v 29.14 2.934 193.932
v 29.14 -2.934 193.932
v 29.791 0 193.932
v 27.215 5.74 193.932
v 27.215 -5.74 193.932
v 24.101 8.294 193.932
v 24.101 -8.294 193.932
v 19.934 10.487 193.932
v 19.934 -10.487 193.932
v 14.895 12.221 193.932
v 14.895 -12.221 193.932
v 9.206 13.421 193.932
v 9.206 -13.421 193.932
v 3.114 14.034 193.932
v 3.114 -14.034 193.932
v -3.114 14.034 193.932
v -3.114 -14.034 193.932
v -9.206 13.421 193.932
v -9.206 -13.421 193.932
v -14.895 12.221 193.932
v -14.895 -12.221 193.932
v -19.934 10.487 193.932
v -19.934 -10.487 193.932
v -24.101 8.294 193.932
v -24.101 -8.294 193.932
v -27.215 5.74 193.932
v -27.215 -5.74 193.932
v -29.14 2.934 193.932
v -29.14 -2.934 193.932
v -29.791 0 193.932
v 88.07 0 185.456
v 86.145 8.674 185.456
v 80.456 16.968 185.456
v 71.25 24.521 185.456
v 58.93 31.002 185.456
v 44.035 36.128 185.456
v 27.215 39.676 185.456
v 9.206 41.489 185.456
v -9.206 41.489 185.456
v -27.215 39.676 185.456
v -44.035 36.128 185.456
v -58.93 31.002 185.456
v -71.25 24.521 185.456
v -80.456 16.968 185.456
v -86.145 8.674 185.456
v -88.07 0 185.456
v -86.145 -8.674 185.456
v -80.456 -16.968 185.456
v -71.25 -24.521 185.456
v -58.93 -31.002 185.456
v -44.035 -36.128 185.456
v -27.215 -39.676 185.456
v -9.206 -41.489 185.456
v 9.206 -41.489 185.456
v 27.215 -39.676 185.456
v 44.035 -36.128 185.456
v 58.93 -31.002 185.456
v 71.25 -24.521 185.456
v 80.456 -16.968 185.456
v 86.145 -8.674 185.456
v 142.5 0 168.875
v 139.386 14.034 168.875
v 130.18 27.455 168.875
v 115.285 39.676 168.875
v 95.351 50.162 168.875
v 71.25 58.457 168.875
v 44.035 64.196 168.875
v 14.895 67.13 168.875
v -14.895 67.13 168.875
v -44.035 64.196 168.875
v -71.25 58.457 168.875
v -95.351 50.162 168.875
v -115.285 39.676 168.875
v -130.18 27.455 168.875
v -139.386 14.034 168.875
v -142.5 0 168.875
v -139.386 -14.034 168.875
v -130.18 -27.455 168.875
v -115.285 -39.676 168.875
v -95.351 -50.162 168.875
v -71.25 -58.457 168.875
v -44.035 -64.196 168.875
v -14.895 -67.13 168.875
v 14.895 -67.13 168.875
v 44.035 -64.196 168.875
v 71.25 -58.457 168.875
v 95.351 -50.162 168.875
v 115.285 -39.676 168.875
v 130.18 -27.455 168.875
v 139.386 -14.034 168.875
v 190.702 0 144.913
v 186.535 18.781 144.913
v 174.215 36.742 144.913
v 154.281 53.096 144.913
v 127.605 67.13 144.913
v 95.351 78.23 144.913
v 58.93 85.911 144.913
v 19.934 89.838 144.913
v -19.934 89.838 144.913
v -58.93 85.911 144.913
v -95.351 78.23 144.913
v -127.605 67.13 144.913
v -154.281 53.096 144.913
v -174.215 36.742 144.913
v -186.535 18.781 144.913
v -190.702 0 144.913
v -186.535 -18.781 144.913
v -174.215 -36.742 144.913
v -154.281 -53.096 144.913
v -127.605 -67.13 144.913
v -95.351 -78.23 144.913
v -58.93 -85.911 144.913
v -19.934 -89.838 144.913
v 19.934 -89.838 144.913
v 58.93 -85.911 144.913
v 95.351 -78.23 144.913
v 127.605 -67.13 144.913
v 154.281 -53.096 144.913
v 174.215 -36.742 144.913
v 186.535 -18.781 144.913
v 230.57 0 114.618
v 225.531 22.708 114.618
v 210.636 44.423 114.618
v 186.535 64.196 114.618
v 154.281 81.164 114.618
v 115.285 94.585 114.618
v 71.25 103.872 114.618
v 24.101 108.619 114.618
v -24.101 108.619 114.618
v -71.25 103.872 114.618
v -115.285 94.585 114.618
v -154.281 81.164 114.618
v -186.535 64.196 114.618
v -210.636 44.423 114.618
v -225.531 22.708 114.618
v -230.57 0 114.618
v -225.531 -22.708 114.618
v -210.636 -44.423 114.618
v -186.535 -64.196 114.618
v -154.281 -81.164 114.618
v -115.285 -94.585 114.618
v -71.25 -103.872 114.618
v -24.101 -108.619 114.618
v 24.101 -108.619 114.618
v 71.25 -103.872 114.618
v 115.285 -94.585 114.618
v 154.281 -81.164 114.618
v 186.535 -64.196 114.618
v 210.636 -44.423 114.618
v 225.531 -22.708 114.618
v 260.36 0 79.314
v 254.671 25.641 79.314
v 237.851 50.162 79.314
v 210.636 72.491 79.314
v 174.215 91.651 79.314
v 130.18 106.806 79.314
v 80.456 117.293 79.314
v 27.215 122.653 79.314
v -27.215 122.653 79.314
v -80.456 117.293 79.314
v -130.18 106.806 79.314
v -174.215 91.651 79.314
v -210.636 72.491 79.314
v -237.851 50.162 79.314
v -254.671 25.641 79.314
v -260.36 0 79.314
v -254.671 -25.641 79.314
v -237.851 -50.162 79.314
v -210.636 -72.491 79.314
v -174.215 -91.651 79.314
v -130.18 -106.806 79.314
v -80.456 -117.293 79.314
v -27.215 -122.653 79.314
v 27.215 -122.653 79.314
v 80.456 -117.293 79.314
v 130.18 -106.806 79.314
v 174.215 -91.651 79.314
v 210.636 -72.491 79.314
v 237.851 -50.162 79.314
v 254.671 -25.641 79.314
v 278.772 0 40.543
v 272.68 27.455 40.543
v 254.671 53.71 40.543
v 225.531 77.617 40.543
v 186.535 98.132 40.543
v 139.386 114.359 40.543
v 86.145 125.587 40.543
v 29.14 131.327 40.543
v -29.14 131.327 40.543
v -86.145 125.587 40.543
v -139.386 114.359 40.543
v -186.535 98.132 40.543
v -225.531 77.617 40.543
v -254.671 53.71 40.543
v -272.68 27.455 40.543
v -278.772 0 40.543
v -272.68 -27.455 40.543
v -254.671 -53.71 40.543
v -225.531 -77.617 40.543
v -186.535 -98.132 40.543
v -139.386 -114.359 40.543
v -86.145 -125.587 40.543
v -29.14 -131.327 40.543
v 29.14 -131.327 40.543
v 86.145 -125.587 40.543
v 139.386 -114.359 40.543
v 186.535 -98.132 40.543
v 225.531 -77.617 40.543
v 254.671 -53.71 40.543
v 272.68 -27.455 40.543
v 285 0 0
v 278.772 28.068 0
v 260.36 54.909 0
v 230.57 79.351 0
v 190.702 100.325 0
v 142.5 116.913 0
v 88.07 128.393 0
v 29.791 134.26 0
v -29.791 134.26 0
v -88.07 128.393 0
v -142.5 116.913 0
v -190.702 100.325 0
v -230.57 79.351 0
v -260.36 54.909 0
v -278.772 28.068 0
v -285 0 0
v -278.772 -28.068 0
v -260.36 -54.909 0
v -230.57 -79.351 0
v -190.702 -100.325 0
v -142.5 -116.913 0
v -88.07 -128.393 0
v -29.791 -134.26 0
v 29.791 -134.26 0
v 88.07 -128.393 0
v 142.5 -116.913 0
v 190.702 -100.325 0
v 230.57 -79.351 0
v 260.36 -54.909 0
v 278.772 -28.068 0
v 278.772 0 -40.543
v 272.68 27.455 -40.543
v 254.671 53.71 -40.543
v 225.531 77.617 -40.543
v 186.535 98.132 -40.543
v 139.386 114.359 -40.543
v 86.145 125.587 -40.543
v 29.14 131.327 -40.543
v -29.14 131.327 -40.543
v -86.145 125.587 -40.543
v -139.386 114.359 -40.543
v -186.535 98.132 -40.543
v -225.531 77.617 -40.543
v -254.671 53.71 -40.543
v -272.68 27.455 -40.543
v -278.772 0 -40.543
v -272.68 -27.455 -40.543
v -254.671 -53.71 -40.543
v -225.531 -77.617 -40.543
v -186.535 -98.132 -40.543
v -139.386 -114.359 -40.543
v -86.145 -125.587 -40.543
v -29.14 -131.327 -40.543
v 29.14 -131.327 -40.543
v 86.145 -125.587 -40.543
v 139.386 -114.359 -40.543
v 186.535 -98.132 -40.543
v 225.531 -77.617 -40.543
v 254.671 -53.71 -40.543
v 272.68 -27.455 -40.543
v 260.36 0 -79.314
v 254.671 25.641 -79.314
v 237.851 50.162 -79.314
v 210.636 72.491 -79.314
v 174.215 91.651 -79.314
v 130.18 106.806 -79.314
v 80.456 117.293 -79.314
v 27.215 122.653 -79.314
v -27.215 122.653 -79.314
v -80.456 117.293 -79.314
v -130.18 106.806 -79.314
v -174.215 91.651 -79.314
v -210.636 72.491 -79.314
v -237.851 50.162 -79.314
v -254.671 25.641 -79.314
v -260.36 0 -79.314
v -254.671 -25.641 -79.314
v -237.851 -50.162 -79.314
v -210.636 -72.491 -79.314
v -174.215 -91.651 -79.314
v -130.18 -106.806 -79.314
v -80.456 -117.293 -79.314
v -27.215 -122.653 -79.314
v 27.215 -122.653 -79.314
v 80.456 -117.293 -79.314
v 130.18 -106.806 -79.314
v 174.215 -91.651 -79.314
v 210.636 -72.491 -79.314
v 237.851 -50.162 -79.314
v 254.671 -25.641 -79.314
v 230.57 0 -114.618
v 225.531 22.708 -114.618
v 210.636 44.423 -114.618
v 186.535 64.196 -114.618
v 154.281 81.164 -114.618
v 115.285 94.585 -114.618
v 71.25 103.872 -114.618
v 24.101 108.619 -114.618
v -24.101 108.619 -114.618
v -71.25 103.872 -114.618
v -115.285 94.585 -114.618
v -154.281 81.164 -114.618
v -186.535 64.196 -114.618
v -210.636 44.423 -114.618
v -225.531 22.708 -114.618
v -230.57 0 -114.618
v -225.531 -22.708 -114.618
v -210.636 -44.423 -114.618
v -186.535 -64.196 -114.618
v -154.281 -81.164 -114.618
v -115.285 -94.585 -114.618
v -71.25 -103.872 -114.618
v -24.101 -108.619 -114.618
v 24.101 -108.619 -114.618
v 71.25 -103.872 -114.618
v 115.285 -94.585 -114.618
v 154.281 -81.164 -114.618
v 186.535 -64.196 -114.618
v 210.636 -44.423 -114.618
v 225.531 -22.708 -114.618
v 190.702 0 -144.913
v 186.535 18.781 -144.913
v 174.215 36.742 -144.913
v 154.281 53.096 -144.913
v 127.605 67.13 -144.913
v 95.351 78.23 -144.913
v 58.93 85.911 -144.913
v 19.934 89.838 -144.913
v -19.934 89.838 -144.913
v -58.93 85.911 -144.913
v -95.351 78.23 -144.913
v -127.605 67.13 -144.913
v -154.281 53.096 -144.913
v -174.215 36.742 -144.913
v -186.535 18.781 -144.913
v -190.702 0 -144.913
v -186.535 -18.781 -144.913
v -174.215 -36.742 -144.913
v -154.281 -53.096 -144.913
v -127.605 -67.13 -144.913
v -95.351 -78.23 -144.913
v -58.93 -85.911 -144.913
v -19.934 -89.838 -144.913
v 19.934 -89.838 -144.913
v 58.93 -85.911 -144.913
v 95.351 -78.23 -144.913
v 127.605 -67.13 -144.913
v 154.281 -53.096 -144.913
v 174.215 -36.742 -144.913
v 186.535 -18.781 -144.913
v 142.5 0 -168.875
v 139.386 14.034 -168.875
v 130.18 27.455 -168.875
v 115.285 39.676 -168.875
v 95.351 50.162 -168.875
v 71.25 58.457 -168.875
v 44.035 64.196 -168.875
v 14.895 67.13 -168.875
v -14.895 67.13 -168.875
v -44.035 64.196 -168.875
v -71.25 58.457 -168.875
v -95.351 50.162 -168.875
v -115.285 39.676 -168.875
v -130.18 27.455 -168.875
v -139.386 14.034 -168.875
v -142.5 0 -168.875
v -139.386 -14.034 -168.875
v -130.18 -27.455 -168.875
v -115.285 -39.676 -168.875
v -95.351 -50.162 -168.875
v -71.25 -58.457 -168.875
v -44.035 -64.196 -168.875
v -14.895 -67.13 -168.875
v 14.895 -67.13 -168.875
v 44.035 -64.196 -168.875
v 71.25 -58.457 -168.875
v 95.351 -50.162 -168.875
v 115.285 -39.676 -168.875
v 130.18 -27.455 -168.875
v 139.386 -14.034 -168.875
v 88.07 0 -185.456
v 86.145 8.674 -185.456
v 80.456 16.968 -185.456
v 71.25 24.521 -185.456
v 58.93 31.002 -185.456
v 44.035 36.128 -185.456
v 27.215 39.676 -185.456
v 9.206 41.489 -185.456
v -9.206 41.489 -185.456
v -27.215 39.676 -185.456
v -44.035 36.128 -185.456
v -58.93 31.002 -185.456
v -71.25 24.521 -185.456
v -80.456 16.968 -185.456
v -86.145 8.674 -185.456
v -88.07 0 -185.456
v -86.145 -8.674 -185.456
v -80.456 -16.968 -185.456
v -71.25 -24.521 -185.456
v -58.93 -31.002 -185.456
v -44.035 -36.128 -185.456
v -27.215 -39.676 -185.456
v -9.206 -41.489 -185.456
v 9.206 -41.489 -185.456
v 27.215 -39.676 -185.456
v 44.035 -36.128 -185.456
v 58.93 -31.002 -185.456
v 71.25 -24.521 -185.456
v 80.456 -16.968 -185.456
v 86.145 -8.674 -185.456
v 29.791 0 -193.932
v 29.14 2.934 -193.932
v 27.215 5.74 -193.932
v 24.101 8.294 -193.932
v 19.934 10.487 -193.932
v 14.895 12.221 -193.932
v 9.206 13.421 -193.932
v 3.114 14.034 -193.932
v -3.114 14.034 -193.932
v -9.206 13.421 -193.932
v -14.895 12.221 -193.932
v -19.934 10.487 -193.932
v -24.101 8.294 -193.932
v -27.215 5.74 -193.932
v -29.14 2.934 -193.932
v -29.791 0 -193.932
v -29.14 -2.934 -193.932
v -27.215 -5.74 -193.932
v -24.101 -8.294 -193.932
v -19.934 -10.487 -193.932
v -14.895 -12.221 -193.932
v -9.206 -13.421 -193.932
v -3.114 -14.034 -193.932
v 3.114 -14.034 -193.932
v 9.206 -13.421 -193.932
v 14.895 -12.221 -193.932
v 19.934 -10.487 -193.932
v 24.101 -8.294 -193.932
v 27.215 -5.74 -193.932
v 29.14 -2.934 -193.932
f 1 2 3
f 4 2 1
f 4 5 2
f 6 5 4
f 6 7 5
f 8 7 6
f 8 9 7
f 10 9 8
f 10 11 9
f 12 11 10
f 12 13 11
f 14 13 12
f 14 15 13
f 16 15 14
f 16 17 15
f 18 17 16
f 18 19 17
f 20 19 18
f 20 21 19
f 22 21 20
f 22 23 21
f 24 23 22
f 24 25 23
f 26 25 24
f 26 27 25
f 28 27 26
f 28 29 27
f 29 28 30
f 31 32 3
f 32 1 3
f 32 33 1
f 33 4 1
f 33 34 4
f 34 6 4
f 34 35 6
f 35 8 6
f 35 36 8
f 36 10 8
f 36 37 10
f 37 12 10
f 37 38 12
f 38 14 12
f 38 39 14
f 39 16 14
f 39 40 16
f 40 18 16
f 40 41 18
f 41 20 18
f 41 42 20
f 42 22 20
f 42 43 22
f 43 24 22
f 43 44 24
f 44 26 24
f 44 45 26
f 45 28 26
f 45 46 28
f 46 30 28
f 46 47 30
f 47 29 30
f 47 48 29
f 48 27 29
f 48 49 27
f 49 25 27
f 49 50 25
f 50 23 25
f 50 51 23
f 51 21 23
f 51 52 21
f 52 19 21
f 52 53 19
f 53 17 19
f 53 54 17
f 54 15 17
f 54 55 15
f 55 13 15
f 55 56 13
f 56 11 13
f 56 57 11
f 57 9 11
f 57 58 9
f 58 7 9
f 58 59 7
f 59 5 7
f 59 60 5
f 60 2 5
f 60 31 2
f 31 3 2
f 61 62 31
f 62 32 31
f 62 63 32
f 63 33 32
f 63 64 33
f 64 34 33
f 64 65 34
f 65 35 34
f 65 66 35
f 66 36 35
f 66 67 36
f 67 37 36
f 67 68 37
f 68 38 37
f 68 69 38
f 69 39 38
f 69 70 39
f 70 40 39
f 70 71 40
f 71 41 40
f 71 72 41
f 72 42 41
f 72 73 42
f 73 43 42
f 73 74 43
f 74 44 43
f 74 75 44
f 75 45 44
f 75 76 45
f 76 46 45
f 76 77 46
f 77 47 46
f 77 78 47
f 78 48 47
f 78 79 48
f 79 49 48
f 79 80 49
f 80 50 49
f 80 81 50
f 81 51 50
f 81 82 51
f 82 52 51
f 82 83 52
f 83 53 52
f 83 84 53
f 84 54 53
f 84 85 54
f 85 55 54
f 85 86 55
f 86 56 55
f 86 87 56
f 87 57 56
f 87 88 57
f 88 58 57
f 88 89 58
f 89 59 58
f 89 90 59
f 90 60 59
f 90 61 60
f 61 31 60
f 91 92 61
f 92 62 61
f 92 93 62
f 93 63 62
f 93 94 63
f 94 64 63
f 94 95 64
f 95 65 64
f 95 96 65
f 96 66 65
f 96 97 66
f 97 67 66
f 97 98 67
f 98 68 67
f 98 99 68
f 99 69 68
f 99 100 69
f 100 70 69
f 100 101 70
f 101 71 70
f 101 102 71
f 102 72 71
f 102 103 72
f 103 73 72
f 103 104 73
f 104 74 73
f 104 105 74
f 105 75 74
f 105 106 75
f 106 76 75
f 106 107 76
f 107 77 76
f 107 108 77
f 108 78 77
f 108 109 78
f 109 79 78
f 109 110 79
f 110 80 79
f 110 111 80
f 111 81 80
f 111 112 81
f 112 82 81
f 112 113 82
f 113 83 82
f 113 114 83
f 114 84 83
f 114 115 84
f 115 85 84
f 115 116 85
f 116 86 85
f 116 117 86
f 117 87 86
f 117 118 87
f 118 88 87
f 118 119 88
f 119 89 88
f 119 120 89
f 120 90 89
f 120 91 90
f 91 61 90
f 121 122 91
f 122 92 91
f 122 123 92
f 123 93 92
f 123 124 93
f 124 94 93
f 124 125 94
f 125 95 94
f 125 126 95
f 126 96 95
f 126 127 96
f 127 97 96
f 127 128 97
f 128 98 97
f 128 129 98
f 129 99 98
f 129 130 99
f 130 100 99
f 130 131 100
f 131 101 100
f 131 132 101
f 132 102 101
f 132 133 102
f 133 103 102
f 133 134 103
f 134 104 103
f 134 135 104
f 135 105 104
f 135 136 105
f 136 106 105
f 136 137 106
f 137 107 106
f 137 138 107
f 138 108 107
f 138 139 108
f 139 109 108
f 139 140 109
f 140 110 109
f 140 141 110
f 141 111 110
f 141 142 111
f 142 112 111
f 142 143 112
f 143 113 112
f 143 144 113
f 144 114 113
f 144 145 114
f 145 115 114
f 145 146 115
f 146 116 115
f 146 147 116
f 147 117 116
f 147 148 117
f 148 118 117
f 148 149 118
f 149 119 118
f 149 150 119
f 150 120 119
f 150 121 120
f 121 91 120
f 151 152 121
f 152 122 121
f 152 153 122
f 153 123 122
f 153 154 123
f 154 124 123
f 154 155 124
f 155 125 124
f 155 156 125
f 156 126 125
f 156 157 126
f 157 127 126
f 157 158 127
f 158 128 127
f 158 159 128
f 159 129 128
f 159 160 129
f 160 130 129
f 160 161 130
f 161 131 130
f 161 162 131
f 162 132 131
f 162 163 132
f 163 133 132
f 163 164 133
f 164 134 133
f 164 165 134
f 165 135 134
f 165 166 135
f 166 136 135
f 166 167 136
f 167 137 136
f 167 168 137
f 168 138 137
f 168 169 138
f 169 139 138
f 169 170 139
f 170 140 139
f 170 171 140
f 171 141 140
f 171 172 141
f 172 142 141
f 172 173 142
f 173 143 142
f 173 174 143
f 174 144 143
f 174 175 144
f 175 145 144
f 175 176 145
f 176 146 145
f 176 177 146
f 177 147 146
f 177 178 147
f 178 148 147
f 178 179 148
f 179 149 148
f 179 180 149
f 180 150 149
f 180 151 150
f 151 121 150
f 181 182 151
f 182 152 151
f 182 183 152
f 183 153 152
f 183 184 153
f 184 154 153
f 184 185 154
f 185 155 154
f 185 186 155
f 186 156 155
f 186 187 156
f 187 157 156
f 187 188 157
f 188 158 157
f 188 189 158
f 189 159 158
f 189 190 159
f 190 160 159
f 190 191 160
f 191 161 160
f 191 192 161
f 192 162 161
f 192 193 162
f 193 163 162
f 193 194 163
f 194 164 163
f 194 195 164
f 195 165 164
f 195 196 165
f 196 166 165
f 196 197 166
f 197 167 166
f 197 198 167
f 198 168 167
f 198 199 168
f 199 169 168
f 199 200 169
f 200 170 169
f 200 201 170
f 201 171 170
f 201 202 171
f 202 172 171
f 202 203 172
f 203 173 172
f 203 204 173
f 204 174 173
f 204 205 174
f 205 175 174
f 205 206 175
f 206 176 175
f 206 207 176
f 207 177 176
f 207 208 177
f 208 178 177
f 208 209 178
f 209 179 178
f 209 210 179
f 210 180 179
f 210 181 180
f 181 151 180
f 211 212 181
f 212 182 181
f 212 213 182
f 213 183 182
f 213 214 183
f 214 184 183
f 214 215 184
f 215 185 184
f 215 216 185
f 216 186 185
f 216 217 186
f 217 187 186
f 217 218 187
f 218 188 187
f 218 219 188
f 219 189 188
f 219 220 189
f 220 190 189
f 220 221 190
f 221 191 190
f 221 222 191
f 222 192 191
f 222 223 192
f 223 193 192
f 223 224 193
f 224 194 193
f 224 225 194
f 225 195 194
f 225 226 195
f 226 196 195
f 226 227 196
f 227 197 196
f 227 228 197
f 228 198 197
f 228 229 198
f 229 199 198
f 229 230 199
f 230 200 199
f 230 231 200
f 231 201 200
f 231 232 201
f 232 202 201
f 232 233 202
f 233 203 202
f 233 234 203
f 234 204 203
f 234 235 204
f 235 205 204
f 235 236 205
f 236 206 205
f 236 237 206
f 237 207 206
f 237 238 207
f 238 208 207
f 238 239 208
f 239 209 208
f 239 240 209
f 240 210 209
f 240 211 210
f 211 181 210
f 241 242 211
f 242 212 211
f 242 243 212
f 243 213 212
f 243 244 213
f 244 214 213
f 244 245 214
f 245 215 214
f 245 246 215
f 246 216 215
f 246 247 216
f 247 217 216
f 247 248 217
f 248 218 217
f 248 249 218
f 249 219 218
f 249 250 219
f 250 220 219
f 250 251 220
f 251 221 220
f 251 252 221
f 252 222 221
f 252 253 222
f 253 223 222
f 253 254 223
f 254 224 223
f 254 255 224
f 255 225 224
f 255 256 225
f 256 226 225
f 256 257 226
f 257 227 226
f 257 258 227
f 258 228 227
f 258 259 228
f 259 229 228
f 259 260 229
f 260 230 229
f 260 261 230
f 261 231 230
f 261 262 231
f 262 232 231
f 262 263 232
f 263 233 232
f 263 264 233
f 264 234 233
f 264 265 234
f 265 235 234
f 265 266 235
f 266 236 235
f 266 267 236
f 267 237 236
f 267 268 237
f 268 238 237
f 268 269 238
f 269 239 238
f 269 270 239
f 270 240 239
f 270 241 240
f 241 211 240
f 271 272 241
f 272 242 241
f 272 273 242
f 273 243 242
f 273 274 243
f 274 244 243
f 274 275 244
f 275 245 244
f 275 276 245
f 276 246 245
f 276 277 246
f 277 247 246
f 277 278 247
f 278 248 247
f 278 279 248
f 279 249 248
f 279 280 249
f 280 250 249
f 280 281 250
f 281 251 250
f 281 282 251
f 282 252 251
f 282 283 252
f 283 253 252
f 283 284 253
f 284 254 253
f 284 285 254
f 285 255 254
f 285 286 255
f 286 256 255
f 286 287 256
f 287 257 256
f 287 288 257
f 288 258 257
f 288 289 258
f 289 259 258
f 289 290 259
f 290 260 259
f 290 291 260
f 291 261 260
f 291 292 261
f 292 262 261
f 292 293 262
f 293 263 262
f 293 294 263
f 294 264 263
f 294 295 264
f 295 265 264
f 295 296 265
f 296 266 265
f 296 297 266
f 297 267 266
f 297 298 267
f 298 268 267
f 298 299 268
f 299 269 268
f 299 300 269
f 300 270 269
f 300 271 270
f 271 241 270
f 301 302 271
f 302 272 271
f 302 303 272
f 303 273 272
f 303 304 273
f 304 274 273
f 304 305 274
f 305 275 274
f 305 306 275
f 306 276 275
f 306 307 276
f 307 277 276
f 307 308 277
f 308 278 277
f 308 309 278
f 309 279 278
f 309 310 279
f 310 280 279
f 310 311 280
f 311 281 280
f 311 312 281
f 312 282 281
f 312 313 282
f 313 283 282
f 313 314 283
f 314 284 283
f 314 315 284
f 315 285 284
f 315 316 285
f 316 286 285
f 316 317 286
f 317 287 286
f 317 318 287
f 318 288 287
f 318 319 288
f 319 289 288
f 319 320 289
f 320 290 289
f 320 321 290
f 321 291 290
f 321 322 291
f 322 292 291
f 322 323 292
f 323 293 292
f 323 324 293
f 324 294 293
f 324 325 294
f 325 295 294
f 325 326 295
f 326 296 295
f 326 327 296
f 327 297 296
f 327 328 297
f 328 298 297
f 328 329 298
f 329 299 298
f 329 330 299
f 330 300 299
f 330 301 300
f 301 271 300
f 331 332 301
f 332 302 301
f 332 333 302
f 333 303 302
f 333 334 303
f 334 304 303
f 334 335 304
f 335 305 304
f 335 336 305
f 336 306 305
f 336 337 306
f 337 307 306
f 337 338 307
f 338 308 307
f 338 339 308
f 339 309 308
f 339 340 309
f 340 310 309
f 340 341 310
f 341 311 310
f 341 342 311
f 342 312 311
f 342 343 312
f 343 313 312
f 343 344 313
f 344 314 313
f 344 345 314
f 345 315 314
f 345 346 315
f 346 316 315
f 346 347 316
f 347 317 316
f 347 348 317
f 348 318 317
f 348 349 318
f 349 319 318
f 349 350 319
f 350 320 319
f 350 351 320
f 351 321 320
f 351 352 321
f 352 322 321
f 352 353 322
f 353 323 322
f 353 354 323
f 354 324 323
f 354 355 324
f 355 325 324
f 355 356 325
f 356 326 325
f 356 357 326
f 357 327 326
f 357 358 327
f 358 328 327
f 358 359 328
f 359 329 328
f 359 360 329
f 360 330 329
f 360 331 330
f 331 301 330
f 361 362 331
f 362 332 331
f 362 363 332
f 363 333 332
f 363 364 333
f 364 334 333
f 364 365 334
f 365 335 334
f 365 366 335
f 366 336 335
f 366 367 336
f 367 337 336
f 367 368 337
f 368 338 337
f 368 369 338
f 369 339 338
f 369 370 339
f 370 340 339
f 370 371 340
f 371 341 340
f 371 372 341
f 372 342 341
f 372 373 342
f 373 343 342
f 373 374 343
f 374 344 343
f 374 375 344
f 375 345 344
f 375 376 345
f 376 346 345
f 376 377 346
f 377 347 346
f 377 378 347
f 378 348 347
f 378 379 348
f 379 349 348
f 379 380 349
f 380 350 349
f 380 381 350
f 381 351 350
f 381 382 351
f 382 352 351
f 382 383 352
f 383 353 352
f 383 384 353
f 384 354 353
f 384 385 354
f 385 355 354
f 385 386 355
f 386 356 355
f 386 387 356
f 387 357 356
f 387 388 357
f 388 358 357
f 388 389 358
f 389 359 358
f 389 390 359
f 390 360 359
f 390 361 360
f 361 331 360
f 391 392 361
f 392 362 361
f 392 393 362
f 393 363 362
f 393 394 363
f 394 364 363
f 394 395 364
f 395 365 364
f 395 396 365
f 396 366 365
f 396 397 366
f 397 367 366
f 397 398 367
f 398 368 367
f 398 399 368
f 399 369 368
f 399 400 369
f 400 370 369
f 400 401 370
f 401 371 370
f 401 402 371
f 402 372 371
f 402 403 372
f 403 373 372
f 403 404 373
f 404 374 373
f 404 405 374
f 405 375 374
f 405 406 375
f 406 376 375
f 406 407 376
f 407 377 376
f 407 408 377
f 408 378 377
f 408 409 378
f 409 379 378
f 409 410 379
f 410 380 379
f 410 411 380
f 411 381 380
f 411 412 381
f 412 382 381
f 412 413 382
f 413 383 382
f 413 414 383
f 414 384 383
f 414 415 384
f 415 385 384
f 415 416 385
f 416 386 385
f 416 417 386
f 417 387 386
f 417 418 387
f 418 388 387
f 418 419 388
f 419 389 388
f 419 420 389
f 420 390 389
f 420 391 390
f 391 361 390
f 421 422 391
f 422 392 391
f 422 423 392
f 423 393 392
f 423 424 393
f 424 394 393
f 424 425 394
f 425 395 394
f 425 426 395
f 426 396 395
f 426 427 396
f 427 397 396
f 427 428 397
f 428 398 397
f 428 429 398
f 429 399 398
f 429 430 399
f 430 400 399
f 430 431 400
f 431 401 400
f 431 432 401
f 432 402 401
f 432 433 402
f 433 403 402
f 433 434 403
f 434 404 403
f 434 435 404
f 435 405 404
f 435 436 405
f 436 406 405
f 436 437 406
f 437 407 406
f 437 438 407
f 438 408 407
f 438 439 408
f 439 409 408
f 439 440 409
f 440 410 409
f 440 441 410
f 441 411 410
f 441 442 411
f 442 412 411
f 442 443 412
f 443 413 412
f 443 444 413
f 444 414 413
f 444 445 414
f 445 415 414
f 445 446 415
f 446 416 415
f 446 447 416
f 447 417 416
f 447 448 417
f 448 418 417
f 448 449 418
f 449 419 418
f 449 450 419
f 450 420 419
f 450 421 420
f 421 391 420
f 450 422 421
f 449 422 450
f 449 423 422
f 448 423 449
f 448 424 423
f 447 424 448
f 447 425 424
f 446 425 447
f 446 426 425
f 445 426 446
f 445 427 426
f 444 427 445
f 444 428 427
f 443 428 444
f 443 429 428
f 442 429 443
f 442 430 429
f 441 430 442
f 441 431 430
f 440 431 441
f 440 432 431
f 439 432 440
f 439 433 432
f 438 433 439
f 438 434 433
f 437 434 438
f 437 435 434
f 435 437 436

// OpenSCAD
// Generated by SolidPython 1.0.1 on 2020-07-29 00:46:54


scale(v = [19, 9, 13]) {
	sphere(r = 15);
}
/***********************************************
*********      SolidPython code:      **********
************************************************
 
# import packages: SolidPython
from solid import *
from solid.utils import *
from itertools import chain, combinations, permutations


class Resize:

    def __init__(self, scad_file):
        self.scad_file = scad_file
        #self.scad_file = import_scad(scad_file)
        # cone/cylinder param:
        self.r1 = 0
        self.r2 = 0
        self.h = 0
        # rectangular prism param:
        self.w = 0
        self.l = 0
        # ellipse param:
        self.r = 0

    # import OpenScad code (file name corresponds to shape)


    # classify shape + parameters
    def assign(self, param1, param2, param3):
        if self.scad_file == 'cone.scad':
            self.r1 = param1
            self.r2 = param2
            self.h = param3
        elif self.scad_file == 'cylinder.scad':
            self.r1 = param1
            self.r2 = param2
            self.h = param3
        elif self.scad_file == 'rectangularPrism.scad':
            self.h = param1
            self.l = param2
            self.w = param3
        else:
            self.r = param1
            self.h = param2

    # resize parameters
    def iterate(self):
        x = range(3, 20, 2)
        i = 1
        if self.scad_file == 'cone.scad':
            tempList = list(permutations(x, 2))
            for temp in tempList:
                param1 = temp[0]
                param2 = temp[1]
                filepath = 'produced_scad_files/' + 'cone' + str(param1) + '_' + str(param2) + '_' + '.scad'
                scad_render_to_file(cylinder(h=param1, r1=param2, r2=0), filepath)

        elif self.scad_file == 'cylinder.scad':
            tempList = list(permutations(x, 3))
            for temp in tempList:
                param1 = temp[0]
                param2 = temp[1]
                filepath = 'produced_scad_files/' + 'cylinder' + str(param1) + '_' + str(param2) + '_' + '.scad'
                scad_render_to_file(cylinder(h=param1, r1=param2, r2=param2), filepath)

        elif self.scad_file == 'rectangularPrism.scad':
            tempList = list(permutations(x, 3))
            for temp in tempList:
                param1 = temp[0]
                param2 = temp[1]
                param3 = temp[2]
                filepath = 'produced_scad_files/' + 'rectangularPrism' + str(param1) + '_' + str(param2) + '_' + str(
                    param3) + '.scad'
                scad_render_to_file(cube(size=(param1, param2, param3)), filepath)

        elif self.scad_file == 'ellipse.scad':
            tempList = list(permutations(x, 4))
            for temp in tempList:
                param1 = temp[0]
                param2 = temp[1]
                param3 = temp[2]
                param4 = temp[3]
                filepath = 'produced_scad_files/' + 'ellipse' + str(param1) + '_' + str(param2) + '_' + str(param3) + '_' + str(param4) + '.scad'
                scad_render_to_file(scale([param1, param2, param3])(sphere(r=param4)), filepath)

    def render_to_scadfile(self):
        scad_render_to_file(scad, 'example.scad') 
 
************************************************/
